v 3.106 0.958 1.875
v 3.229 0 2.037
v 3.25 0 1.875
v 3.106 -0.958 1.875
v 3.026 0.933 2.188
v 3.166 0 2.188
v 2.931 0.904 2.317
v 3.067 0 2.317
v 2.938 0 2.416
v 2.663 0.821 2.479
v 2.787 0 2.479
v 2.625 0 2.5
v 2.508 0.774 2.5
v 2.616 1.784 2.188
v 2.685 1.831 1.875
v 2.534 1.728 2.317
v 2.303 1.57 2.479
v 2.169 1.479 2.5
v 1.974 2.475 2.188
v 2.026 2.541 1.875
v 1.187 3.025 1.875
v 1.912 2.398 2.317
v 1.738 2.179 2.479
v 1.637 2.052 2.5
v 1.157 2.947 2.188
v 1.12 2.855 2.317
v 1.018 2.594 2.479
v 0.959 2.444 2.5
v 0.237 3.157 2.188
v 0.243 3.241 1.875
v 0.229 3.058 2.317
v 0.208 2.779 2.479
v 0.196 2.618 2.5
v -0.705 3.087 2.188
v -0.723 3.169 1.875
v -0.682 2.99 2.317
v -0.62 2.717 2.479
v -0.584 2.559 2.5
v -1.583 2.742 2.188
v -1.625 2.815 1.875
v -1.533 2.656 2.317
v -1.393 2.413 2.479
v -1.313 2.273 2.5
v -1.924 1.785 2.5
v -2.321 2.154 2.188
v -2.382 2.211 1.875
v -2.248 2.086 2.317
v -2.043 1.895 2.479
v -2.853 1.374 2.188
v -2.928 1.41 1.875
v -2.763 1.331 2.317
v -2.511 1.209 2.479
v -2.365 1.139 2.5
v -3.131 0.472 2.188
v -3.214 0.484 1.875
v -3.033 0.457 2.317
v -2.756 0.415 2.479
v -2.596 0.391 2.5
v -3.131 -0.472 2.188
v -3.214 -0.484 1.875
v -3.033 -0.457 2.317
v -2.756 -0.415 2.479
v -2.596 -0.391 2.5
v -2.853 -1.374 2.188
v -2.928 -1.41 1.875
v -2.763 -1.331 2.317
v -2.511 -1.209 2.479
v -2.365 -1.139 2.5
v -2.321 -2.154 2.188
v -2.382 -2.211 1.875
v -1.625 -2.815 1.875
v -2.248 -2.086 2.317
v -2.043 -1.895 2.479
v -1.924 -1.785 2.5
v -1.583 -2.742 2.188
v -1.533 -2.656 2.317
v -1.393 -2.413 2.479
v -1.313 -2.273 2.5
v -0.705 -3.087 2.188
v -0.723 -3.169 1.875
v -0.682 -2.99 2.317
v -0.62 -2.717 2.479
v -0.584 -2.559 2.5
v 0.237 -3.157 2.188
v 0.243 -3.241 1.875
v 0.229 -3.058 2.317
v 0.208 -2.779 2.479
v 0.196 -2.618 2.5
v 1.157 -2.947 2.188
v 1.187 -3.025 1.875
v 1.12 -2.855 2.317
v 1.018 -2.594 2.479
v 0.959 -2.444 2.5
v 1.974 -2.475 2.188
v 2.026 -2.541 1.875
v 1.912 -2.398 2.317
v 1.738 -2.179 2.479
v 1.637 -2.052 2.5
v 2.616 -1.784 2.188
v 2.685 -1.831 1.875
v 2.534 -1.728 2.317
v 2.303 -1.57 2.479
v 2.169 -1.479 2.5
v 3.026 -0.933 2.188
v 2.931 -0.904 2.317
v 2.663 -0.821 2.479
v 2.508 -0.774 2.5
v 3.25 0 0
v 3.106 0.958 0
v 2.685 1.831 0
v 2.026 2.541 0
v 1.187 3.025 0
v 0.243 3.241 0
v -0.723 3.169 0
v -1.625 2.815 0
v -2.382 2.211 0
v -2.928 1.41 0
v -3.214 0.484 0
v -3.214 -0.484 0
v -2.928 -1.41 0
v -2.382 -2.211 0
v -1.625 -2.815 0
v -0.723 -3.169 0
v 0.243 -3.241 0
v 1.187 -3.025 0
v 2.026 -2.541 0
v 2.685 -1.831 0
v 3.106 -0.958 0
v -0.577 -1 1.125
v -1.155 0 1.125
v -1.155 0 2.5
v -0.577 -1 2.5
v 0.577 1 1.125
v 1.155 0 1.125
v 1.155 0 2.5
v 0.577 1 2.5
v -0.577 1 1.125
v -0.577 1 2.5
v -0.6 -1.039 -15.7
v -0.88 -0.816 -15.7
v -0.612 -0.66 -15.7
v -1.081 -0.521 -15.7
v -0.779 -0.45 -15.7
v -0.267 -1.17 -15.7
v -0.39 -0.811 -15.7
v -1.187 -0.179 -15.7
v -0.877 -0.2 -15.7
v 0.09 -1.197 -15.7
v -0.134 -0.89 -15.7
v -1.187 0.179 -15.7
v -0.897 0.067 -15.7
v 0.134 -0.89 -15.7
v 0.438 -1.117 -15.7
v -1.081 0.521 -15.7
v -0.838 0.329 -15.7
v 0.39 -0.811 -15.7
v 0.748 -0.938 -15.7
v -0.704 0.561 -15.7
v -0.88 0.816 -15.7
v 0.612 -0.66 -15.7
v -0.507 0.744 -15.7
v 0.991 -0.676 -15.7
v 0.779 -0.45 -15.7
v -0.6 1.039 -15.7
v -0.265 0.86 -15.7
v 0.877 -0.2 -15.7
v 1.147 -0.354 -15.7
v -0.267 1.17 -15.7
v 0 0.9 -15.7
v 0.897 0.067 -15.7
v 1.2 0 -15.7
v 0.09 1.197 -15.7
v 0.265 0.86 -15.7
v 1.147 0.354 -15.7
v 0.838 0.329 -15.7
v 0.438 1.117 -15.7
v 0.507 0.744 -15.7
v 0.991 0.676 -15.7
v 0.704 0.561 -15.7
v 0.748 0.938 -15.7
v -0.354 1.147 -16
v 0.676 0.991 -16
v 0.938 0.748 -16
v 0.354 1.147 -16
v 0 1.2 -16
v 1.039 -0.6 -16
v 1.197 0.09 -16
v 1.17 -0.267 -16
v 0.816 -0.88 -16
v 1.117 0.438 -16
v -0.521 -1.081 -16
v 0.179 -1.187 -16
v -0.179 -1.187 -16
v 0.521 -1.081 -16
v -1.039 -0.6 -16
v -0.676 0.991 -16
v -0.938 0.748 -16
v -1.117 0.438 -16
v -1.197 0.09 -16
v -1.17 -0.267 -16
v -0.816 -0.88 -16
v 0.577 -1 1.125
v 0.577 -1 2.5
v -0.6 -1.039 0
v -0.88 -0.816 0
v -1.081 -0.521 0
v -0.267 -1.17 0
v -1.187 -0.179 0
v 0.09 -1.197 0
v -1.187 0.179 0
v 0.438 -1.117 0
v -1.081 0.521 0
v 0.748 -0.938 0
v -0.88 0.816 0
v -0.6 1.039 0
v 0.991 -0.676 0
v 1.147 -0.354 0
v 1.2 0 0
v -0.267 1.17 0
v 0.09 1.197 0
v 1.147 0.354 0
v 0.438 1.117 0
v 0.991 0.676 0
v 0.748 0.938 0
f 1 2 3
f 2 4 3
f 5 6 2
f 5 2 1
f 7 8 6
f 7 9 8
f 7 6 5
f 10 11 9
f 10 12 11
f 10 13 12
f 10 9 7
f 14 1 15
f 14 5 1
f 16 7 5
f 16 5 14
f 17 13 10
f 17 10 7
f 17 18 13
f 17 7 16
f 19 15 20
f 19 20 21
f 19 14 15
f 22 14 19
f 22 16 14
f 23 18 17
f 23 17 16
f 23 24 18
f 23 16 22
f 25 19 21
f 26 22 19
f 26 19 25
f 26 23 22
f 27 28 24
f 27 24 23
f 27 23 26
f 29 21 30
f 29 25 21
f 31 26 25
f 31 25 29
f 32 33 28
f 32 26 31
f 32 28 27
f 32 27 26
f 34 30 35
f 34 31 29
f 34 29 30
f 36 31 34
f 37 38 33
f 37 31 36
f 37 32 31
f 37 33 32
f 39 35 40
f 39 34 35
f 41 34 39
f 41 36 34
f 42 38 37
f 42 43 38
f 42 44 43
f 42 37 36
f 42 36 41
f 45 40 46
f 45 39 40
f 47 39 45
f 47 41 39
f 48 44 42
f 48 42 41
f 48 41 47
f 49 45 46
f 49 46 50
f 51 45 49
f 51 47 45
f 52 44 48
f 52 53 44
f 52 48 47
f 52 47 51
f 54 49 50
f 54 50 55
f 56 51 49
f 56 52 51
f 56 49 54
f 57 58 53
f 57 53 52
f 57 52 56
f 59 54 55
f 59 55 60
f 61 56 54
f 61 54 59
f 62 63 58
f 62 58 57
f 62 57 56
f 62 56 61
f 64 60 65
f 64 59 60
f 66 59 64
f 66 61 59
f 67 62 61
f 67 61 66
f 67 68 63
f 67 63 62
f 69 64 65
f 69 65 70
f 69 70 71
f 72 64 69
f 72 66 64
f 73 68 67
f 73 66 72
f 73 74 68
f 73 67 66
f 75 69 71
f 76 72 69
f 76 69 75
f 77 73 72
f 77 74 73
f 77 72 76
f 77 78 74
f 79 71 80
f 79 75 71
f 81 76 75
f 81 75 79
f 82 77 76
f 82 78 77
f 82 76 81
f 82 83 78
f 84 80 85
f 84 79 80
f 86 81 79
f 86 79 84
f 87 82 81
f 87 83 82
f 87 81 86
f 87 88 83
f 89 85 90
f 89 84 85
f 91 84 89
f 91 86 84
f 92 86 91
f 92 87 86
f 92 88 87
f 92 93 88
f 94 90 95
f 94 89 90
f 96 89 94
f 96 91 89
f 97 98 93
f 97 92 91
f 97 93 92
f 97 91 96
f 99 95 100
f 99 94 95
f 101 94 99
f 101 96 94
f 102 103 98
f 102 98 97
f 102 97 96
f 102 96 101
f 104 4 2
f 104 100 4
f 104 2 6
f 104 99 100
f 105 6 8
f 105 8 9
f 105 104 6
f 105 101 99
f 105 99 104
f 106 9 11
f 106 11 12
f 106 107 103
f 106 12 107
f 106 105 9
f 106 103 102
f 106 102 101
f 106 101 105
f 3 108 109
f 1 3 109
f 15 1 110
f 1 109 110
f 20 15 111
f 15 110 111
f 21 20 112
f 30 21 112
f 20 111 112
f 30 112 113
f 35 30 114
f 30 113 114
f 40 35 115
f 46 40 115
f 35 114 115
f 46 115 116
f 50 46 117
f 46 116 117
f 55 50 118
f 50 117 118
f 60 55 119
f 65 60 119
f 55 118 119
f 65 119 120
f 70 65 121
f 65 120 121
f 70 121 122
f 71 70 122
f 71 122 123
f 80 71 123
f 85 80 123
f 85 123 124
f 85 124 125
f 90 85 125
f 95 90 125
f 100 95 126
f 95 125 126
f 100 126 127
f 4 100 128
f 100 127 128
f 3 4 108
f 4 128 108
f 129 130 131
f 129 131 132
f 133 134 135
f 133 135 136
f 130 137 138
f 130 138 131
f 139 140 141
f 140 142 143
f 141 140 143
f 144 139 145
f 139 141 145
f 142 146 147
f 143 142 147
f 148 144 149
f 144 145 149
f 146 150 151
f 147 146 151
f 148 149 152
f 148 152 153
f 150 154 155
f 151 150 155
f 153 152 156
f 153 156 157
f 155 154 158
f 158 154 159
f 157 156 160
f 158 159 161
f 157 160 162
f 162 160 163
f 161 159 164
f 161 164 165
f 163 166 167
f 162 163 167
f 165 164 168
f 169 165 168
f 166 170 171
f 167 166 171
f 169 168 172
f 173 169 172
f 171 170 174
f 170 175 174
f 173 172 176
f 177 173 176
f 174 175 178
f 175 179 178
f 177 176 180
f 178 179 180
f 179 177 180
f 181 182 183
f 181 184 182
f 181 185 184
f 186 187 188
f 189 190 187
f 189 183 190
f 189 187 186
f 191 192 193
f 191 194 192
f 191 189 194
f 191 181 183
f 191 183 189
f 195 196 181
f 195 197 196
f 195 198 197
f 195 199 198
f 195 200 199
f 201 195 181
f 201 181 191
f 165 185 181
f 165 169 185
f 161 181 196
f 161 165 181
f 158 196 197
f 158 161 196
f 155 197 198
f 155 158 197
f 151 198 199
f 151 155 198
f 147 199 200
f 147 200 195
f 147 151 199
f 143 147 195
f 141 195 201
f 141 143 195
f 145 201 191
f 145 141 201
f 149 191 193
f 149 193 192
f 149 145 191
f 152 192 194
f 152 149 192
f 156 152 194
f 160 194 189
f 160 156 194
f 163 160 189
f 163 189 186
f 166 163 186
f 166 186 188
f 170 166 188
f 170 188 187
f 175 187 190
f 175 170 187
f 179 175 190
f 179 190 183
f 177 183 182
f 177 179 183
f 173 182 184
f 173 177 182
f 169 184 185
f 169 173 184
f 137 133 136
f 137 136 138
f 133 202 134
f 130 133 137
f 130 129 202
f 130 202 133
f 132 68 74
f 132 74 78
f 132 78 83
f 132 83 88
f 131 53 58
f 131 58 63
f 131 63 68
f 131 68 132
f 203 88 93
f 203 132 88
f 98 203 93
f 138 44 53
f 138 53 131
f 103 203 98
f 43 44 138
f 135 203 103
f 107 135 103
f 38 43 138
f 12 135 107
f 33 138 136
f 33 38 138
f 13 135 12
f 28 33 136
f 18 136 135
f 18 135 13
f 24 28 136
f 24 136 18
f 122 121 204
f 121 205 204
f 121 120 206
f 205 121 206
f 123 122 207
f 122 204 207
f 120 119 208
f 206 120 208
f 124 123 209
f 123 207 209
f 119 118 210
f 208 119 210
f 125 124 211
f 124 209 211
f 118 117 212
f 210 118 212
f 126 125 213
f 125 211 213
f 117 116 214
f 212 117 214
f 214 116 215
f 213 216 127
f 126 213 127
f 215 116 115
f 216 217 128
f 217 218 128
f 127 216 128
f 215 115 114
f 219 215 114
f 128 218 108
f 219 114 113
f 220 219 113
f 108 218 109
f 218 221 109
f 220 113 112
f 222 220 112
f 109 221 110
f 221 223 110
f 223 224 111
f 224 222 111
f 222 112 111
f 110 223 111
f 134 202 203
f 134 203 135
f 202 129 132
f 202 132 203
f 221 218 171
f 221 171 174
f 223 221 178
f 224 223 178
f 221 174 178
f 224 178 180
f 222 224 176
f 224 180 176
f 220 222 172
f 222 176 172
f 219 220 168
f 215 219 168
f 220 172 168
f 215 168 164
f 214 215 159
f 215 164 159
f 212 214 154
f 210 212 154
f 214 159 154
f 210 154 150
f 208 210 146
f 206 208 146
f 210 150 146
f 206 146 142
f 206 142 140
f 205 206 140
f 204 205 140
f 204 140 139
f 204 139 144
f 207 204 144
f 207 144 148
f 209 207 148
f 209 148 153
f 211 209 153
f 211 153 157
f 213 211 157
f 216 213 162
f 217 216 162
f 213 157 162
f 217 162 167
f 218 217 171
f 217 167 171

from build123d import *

# Parameters (mm, degrees)
F_0060_CYLINDER_SKETCH_R    = 3.25
F_0060_CYLINDER_DEPTH       = 2.5
F_0061_FILLET_R             = 0.625
F_0062_EXTRUDE_DEPTH        = 1.385
F_0062_EXTRUDE_ROTATE_ANGLE = 120
F_0065_CYLINDER_SKETCH_R    = 1.2
F_0065_CYLINDER_DEPTH       = 15.7
F_0066_CONE_ROTATE_ANGLE    = 90


with BuildPart() as part:
    # 0060_cylinder_Sketch → 0060_cylinder (new body)
    with BuildSketch(Plane.XY):
        Circle(F_0060_CYLINDER_SKETCH_R)
    extrude(amount=F_0060_CYLINDER_DEPTH)

    # 0061_fillet
    f_0061_fillet_edges = [part.edges().sort_by_distance(p)[0] for p in [
        (-3.25, 0, 2.5),
    ]]
    fillet(f_0061_fillet_edges, radius=F_0061_FILLET_R)


with BuildPart() as body_2:
    # 0062_extrude_Sketch → 0062_extrude (new body)
    with BuildSketch(Plane.XY):
        Polygon((0, 0), (1.154700538, 0), (1.732050808, 1), (1.154700538, 2), (0, 2), (-0.577350269, 1), align=None)
    extrude(amount=F_0062_EXTRUDE_DEPTH)


with BuildPart() as body_2_1:
    # 0062_extrude_Rotate: read off the stored shape, not the designer's step
    # 0062_extrude_Rotate: moved
    add(body_2.part.rotate(Axis((0, 0, 0), (0, 0, 1)), F_0062_EXTRUDE_ROTATE_ANGLE))


with BuildPart() as body_2_2:
    # 0062_extrude_Translate: moved
    add(body_2_1.part.moved(Location((1.154700538, 0, 1.125))))


with BuildPart() as part_1:
    add(part.part)

    # 0064_sub: cut body 2
    add(body_2_2.part, mode=Mode.SUBTRACT)


with BuildPart() as body_2_2_1:
    # 0065_cylinder_Sketch → 0065_cylinder (new body)
    with BuildSketch(Plane.XY):
        Circle(F_0065_CYLINDER_SKETCH_R)
    extrude(amount=F_0065_CYLINDER_DEPTH)


with BuildPart() as body_2_2_2:
    # 0065_cylinder_Translate: moved
    add(body_2_2_1.part.moved(Location((0, 0, -15.7))))


with BuildPart() as body_3:
    # 0066_cone_Sketch → 0066_cone (revolve)
    with BuildSketch(Plane.XY, mode=Mode.PRIVATE) as f_0066_cone_sk:
        Polygon((0, 0), (1.2, 0), (0.9, 0.3), (0, 0.3), align=None)
    revolve(f_0066_cone_sk.sketch.rotate(Axis((0, -100, 0), (0, 1, 0)), 90), axis=Axis((0, -100, 0), (0, 1, 0)))


with BuildPart() as body_3_1:
    # 0066_cone_Rotate: moved
    add(body_3.part.rotate(Axis((0, 0, 0), (1, 0, 0)), F_0066_CONE_ROTATE_ANGLE))


with BuildPart() as body_3_2:
    # 0066_cone_Translate: moved
    add(body_3_1.part.moved(Location((0, 0, -16))))


with BuildPart() as body_2_2_3:
    add(body_2_2_2.part)

    # 0068_add: union body 3
    add(body_3_2.part)


with BuildPart() as part_2:
    add(part_1.part)

    # 0069_add: union body 2 2
    add(body_2_2_3.part)


solid = part_2.part
